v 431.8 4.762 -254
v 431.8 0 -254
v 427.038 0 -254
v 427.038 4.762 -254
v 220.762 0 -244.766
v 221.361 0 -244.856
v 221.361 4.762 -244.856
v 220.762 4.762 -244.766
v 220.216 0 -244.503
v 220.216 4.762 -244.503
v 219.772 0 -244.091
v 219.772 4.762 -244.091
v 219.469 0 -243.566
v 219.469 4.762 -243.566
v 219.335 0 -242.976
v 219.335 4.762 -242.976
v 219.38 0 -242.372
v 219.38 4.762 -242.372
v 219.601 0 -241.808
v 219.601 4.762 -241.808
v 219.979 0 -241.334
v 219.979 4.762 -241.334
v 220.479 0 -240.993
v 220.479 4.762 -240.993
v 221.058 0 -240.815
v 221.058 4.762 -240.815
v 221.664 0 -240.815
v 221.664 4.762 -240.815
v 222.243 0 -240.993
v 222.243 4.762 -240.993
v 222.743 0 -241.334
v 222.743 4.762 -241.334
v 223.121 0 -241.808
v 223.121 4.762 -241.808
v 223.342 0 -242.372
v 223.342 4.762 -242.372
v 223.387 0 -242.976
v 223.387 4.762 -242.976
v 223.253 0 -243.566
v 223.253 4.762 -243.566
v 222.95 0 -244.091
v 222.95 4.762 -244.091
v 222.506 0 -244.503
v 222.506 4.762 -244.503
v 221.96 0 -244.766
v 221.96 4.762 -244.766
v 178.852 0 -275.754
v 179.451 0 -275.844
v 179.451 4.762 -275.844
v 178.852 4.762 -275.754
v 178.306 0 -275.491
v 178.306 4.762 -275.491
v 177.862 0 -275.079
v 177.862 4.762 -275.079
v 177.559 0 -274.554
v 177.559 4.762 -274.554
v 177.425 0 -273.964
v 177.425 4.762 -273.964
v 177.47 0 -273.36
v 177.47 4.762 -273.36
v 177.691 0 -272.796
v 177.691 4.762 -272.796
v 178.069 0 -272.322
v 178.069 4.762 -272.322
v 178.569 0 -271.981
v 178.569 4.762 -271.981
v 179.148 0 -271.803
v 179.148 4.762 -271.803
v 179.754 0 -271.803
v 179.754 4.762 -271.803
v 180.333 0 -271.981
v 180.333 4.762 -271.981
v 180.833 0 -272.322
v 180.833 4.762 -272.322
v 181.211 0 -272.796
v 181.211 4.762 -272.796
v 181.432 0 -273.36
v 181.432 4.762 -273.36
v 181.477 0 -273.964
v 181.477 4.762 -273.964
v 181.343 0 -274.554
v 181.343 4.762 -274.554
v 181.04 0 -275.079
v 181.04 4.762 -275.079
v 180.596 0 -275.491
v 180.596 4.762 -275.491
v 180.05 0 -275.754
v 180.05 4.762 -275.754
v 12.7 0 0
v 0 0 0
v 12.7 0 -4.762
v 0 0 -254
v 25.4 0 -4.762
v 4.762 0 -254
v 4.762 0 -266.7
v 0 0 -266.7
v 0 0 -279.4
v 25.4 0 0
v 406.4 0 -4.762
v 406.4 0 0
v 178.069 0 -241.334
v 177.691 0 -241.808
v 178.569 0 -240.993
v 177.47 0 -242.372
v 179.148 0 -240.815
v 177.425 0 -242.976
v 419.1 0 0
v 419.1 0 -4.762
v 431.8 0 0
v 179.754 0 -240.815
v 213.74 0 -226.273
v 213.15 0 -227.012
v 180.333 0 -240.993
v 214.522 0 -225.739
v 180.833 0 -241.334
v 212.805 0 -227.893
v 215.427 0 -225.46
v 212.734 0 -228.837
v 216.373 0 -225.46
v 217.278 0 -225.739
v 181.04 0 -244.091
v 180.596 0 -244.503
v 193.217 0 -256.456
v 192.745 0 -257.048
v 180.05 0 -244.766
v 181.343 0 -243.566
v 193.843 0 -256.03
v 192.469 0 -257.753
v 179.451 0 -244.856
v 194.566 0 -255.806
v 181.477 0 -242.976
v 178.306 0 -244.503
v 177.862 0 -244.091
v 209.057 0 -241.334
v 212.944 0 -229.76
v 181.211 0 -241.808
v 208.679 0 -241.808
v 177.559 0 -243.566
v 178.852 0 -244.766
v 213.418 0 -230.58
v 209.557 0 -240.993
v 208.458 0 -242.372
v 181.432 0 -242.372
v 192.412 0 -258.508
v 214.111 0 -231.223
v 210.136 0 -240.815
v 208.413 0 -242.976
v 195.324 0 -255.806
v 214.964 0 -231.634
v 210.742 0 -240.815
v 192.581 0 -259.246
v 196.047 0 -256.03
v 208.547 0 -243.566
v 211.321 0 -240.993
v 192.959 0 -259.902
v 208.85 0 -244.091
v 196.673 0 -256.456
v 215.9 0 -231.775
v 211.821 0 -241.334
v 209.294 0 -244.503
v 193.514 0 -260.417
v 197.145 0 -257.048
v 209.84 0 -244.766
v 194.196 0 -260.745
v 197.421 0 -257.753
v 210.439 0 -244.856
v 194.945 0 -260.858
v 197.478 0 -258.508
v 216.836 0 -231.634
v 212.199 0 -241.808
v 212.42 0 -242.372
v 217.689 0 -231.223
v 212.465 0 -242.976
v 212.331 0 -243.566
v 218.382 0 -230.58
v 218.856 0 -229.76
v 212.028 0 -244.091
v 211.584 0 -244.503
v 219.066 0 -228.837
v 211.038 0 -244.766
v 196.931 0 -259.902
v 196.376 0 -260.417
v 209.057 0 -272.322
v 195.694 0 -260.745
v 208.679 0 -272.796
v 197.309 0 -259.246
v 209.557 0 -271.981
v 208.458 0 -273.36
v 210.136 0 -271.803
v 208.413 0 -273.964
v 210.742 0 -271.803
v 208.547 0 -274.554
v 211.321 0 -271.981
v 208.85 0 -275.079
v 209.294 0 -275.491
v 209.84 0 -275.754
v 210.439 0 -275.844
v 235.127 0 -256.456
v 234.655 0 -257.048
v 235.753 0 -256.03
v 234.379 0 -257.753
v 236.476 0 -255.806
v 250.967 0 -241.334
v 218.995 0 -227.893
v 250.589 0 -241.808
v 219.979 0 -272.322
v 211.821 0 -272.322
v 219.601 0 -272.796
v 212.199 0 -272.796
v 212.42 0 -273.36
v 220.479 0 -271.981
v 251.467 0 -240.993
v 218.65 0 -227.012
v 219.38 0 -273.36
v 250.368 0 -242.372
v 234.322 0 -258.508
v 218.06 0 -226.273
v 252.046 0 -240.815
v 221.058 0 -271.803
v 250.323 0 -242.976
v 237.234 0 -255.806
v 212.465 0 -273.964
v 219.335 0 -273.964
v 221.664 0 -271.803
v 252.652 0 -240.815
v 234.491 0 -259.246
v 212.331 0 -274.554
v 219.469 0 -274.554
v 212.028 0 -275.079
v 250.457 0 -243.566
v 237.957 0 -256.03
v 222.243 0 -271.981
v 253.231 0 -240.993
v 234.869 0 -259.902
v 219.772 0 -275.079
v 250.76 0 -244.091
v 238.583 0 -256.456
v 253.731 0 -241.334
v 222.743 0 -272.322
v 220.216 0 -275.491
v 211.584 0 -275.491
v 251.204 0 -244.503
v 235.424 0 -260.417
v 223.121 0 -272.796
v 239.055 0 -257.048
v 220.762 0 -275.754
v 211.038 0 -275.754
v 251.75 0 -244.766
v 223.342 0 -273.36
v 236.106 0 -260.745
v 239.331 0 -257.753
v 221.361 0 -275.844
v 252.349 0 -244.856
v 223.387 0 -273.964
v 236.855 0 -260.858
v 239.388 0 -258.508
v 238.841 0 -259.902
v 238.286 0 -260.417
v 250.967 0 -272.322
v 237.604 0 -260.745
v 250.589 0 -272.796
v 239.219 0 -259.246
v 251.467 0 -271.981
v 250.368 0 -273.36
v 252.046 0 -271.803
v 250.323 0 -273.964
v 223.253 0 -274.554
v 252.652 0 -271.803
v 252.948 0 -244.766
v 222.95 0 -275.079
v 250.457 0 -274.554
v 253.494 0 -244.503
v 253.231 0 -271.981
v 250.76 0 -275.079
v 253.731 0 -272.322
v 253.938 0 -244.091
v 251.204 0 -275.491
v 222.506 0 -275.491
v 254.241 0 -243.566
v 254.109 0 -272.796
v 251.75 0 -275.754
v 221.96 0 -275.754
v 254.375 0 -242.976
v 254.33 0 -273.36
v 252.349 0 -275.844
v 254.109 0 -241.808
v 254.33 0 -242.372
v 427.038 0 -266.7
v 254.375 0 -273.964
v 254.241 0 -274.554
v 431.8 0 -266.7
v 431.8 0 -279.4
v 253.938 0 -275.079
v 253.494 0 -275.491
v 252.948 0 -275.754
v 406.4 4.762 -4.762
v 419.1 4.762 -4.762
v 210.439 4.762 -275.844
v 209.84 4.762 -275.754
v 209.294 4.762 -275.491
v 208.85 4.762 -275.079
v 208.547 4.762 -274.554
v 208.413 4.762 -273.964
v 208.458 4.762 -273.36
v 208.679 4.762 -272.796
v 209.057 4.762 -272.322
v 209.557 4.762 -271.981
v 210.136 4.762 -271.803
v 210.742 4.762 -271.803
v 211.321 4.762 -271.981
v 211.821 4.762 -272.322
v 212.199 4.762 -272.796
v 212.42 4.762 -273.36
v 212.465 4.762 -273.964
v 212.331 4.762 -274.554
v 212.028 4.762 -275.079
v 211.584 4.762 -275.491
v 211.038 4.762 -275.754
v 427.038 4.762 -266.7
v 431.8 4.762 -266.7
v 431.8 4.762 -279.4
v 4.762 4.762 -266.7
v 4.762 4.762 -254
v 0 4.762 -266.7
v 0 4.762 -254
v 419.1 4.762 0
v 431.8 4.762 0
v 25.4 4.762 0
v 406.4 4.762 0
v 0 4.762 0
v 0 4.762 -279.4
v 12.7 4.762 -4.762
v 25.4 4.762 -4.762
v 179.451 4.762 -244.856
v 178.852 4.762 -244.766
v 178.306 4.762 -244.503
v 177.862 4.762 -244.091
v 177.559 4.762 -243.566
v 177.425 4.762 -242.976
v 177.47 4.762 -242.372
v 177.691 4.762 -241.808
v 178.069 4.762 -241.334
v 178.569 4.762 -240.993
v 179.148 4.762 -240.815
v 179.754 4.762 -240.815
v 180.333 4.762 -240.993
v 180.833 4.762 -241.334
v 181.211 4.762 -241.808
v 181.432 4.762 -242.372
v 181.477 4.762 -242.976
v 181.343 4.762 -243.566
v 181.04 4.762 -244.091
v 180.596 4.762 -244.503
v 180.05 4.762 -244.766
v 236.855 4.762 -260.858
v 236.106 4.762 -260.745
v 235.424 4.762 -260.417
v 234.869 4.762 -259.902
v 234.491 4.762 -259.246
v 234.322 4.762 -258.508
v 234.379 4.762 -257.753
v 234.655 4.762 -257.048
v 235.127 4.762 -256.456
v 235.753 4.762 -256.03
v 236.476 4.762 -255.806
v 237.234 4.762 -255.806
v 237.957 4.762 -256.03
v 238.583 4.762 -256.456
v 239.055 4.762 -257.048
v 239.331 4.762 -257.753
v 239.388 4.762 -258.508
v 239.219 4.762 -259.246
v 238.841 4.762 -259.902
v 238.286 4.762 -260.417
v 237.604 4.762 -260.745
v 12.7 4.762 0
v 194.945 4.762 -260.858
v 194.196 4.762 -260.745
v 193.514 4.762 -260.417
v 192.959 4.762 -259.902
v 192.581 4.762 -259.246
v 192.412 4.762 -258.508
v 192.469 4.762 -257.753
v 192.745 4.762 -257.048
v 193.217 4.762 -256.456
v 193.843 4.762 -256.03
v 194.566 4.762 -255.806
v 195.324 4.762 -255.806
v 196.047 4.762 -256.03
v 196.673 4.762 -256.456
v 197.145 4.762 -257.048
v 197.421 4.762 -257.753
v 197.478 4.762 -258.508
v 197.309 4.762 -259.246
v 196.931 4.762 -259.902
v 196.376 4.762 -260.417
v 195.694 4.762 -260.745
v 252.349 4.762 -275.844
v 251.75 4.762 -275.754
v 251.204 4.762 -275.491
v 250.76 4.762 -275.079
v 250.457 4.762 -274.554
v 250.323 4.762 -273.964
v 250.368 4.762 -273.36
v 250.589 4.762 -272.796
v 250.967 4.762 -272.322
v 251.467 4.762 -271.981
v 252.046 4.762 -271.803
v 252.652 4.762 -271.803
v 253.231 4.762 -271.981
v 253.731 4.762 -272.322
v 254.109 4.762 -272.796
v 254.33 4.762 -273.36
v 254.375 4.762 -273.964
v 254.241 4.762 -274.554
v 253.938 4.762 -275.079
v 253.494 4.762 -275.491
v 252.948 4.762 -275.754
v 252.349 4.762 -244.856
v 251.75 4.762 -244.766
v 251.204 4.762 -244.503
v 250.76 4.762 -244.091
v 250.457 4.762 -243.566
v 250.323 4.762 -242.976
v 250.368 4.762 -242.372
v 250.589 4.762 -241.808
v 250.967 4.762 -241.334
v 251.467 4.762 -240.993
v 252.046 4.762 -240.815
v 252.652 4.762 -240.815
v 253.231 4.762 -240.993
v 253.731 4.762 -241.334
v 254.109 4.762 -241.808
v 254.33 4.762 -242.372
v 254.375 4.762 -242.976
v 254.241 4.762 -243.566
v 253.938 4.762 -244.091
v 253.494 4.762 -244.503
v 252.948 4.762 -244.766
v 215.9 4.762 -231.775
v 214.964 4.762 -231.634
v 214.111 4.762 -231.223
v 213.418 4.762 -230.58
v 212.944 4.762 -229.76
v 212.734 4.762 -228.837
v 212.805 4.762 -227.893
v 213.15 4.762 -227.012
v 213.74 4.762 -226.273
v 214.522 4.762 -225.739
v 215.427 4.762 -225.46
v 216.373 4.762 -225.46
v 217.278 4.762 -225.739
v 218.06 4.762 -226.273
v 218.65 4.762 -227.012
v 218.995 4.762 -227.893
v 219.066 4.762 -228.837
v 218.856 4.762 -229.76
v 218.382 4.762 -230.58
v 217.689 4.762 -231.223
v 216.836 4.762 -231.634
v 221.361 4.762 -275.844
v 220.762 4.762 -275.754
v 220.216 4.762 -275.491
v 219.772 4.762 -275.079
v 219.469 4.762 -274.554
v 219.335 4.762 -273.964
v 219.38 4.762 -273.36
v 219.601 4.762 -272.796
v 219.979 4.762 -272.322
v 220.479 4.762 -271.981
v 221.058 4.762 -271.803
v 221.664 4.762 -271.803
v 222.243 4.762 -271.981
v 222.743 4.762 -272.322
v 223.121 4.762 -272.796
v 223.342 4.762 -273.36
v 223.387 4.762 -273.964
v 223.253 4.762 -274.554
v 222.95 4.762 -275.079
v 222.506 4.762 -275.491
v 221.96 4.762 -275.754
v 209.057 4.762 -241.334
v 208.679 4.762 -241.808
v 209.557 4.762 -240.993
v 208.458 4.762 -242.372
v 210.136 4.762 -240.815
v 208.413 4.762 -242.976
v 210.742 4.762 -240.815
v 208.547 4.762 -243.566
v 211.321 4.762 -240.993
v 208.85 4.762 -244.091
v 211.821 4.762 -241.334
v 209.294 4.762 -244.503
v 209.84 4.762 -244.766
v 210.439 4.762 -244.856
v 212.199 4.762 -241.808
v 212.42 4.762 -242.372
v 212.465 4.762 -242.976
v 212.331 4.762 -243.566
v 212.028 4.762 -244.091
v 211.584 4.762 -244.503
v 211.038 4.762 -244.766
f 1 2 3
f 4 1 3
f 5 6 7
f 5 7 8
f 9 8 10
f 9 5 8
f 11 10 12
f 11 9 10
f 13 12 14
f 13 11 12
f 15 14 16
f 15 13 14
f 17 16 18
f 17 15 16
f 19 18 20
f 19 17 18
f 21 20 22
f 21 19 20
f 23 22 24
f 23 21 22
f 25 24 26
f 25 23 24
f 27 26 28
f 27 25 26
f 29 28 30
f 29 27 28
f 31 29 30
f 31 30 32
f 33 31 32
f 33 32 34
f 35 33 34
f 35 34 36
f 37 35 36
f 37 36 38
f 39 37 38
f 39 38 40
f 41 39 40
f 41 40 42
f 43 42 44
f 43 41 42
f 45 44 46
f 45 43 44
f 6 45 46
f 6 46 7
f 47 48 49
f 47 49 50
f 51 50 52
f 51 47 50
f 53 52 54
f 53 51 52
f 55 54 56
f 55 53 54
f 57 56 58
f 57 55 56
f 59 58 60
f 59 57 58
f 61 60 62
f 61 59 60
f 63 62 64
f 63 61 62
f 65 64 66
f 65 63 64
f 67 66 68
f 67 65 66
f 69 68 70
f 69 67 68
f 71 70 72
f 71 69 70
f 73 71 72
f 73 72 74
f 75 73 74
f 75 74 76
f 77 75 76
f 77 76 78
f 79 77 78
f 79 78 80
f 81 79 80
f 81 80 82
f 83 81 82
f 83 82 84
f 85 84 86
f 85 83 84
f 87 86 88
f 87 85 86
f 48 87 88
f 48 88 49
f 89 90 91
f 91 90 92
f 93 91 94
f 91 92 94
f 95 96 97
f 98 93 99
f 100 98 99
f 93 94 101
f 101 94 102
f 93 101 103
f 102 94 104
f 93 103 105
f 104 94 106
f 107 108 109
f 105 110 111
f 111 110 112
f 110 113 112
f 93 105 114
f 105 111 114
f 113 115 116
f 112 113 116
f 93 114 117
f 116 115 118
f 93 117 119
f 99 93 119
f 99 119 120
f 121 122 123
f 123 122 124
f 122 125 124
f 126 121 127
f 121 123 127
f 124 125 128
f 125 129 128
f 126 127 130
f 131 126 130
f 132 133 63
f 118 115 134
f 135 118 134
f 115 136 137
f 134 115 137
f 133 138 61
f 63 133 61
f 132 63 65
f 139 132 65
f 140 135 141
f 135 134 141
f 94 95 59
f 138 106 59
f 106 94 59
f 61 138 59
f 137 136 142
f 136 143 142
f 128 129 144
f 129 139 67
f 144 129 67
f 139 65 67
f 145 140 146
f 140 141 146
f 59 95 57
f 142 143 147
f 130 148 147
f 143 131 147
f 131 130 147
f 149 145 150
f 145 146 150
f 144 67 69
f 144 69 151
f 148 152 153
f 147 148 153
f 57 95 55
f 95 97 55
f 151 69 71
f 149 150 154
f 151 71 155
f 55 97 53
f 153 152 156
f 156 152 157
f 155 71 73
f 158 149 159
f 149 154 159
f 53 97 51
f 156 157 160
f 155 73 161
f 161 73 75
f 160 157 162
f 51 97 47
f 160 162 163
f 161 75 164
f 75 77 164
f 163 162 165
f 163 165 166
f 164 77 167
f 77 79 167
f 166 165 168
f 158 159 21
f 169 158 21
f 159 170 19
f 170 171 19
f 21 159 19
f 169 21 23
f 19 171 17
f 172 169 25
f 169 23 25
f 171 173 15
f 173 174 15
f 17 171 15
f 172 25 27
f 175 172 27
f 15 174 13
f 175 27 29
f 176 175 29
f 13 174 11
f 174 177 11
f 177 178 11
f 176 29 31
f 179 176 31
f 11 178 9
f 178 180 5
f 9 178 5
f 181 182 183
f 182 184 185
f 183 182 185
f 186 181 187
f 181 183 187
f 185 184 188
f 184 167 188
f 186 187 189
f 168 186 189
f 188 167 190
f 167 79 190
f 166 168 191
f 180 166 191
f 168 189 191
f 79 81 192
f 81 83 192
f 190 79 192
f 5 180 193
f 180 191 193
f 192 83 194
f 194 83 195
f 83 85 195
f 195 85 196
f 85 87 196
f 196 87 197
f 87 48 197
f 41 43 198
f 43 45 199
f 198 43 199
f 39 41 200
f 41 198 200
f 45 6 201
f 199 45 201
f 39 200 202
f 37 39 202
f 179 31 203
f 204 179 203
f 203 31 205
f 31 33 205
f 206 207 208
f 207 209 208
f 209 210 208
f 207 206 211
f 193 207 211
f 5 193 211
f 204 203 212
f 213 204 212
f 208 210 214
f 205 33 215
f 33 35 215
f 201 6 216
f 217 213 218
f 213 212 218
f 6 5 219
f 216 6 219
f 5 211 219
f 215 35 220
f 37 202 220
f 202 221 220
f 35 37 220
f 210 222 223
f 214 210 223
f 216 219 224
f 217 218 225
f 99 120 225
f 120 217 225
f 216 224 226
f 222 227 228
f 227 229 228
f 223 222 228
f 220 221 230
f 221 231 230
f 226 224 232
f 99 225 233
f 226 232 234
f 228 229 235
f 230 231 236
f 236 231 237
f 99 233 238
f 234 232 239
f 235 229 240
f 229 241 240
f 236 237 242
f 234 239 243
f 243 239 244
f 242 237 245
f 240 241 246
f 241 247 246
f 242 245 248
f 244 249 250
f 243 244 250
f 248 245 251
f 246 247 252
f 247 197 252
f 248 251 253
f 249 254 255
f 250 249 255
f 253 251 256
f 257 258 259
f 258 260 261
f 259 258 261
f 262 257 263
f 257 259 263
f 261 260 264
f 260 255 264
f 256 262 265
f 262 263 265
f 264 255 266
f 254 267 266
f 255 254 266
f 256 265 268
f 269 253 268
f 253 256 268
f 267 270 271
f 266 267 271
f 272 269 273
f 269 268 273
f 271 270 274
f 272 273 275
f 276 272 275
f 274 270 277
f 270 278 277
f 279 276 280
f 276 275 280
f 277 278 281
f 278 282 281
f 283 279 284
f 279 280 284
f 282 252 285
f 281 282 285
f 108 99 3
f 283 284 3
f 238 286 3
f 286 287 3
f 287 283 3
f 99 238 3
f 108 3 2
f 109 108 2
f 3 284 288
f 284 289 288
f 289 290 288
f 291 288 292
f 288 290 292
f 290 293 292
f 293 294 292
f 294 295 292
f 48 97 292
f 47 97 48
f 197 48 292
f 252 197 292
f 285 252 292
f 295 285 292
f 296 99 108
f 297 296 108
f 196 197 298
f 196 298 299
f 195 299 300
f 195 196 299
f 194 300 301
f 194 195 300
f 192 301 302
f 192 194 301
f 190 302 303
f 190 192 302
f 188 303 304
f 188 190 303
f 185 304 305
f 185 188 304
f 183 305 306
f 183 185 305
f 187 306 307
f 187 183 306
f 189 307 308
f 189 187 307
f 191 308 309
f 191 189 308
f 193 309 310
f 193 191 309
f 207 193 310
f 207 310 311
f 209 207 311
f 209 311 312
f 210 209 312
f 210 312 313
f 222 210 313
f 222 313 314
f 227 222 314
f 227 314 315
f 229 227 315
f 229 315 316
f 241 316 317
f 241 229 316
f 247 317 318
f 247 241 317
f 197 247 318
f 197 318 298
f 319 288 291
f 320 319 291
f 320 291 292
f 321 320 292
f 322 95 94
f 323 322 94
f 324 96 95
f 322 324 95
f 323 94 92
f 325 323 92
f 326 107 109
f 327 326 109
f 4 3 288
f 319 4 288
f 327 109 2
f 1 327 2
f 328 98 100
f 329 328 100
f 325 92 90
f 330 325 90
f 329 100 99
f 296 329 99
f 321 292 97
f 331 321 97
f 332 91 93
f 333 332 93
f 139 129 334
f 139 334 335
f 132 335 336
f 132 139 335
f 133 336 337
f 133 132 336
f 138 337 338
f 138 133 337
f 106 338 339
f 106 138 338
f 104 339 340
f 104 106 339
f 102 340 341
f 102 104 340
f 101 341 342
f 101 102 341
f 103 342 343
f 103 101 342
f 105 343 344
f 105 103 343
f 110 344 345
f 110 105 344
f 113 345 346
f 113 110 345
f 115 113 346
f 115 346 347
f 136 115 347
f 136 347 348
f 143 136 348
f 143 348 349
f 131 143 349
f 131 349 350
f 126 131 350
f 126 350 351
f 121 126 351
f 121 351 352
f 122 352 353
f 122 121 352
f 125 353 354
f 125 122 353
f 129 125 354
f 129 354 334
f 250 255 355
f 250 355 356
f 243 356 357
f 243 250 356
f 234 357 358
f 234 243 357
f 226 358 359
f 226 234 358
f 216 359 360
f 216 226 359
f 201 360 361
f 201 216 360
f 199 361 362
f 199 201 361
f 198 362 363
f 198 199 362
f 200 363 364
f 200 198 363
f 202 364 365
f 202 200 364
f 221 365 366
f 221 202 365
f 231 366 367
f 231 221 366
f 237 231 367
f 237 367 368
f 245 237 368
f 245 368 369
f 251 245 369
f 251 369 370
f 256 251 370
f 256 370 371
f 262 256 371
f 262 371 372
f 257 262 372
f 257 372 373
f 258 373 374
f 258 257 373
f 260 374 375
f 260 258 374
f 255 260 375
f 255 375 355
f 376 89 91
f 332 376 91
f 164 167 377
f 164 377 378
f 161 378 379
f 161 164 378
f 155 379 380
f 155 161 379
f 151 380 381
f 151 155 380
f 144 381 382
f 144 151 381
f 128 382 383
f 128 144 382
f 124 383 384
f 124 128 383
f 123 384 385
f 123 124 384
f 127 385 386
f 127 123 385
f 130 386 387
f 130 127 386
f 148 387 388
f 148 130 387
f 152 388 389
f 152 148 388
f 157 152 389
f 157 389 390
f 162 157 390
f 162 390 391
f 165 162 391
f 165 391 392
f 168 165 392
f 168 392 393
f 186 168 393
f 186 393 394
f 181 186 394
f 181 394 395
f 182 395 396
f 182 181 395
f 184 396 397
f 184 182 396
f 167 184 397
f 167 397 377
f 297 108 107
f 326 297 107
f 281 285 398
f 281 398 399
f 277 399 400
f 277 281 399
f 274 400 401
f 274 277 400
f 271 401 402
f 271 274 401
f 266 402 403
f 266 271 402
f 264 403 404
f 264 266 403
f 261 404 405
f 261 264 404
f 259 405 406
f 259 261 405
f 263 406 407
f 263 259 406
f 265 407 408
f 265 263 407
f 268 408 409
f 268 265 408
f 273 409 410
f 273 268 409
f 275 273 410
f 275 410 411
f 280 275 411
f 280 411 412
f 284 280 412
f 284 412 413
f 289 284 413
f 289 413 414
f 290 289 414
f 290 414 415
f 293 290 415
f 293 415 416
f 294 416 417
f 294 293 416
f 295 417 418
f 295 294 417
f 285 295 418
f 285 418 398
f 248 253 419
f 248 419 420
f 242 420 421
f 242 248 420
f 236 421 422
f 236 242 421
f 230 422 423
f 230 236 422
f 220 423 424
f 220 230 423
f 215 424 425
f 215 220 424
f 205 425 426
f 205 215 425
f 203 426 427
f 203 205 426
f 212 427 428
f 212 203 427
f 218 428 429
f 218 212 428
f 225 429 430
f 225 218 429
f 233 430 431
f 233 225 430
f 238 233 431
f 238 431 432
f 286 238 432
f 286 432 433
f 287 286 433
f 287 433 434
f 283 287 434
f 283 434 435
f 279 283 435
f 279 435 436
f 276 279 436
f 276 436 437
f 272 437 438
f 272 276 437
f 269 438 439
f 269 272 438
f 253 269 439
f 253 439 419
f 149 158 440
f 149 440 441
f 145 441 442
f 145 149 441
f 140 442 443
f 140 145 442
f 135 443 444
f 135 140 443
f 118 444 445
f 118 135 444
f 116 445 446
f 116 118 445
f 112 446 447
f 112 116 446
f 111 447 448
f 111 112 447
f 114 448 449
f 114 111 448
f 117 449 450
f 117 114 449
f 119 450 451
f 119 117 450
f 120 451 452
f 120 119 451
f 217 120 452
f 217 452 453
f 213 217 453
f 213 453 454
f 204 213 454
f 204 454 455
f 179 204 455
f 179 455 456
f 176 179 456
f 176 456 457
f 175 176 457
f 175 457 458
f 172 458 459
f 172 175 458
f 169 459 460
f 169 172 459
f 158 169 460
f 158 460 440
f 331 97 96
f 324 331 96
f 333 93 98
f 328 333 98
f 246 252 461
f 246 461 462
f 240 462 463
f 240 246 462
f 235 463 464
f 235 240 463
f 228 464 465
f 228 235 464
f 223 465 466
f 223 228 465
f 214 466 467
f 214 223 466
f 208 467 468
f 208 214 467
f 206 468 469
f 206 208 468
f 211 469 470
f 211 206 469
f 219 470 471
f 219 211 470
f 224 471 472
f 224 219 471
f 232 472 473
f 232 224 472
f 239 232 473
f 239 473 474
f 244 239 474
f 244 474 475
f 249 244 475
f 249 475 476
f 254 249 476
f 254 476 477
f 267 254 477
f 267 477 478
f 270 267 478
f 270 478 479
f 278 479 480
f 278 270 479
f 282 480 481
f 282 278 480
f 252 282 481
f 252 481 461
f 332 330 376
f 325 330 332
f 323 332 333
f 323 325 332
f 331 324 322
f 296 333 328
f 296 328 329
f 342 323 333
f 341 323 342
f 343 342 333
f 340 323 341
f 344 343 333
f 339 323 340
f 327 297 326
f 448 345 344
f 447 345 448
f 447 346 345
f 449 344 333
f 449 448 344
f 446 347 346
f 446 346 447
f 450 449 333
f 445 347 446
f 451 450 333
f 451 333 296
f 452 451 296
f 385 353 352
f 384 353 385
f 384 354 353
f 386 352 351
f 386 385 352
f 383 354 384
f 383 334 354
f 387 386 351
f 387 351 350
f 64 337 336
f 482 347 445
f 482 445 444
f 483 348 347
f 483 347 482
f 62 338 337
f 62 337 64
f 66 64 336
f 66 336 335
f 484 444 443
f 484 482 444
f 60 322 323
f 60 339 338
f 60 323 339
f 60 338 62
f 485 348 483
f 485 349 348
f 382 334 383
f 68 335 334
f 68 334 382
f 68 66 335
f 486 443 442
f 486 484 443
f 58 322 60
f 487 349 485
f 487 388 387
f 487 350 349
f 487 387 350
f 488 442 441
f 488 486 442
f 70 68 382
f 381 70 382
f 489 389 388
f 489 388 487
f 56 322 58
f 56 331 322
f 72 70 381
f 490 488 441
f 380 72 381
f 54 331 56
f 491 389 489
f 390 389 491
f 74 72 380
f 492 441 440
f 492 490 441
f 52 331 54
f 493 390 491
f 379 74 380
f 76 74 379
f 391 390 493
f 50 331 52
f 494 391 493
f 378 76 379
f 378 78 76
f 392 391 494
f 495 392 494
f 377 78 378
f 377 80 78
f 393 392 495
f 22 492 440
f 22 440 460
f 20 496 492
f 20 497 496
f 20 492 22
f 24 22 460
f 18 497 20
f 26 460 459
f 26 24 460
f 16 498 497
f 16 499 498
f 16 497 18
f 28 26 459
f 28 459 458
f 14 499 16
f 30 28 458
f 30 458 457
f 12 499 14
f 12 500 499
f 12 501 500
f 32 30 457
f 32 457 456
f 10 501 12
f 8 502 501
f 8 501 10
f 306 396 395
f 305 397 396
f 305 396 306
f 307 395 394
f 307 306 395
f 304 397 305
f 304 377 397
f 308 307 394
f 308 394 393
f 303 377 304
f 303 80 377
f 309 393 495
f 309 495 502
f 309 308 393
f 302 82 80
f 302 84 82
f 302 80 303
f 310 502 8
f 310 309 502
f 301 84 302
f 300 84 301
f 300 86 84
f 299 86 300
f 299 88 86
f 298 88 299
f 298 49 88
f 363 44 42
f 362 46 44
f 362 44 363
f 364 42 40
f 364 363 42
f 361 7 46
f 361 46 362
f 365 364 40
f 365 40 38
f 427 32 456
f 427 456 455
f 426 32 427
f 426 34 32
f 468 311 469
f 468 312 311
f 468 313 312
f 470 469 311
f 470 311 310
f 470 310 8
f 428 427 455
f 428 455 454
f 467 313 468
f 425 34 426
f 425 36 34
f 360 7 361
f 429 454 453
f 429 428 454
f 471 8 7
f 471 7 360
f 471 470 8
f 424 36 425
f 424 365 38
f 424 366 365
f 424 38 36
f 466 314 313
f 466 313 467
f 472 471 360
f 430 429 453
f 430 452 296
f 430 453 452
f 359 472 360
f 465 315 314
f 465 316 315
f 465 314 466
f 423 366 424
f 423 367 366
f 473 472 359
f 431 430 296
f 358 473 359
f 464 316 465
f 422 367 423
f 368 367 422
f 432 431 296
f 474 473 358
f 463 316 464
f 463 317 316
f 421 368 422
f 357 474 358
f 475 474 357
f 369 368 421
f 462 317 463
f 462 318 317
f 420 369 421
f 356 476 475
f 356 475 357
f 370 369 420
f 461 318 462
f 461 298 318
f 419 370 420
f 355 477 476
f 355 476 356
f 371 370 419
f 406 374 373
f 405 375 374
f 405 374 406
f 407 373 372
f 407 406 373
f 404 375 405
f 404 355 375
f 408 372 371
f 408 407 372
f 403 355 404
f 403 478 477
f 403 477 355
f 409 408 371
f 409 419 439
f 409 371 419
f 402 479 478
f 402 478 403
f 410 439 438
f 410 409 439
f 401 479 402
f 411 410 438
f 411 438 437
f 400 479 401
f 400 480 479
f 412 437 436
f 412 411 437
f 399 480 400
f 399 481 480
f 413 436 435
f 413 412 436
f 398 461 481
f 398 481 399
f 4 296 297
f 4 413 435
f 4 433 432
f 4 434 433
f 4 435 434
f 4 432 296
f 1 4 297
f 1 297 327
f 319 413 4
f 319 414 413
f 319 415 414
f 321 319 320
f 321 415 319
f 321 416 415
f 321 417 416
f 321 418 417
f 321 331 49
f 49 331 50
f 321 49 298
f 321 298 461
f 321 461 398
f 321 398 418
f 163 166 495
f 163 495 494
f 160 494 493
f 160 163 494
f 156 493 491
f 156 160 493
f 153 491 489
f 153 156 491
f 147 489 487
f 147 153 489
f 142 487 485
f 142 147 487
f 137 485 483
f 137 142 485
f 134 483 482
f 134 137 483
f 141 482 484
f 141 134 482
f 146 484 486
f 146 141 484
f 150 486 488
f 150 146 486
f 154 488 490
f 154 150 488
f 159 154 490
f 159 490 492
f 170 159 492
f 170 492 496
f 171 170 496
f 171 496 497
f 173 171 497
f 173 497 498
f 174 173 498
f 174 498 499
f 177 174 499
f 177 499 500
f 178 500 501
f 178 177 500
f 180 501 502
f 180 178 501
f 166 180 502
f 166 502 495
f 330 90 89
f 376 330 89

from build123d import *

# Parameters (mm, degrees)
SKETCH1_R           = 3.175
SKETCH1_R_2         = 2.032
SKETCH1_R_3         = 2.54
BOSS_EXTRUDE1_DEPTH = 4.7625


with BuildPart() as part:
    # Sketch1 → Boss-Extrude1 (new body)
    with BuildSketch(Plane(origin=(0, 0, 0), x_dir=(1, 0, 0), z_dir=(0, 1, 0))):
        Polygon((0, 0), (12.7, 0), (12.7, 4.7625), (25.4, 4.7625), (25.4, 0), (406.4, 0), (406.4, 4.7625), (419.1, 4.7625), (419.1, 0), (431.8, 0), (431.8, 254), (427.0375, 254), (427.0375, 266.7), (431.8, 266.7), (431.8, 279.4), (0, 279.4), (0, 266.7), (4.7625, 266.7), (4.7625, 254), (0, 254), align=None)
        with Locations(Location((215.9, 228.6, 0), (0, 0, 90))):
            Circle(SKETCH1_R, mode=Mode.SUBTRACT)
        with Locations(Location((210.439, 273.812, 0), (0, 0, 90))):
            Circle(SKETCH1_R_2, mode=Mode.SUBTRACT)
        with Locations(Location((179.451, 273.812, 0), (0, 0, 90))):
            Circle(SKETCH1_R_2, mode=Mode.SUBTRACT)
        with Locations(Location((252.349, 273.812, 0), (0, 0, 90))):
            Circle(SKETCH1_R_2, mode=Mode.SUBTRACT)
        with Locations(Location((221.361, 273.812, 0), (0, 0, 90))):
            Circle(SKETCH1_R_2, mode=Mode.SUBTRACT)
        with Locations(Location((194.945, 258.318, 0), (0, 0, 90))):
            Circle(SKETCH1_R_3, mode=Mode.SUBTRACT)
        with Locations(Location((210.439, 242.824, 0), (0, 0, 90))):
            Circle(SKETCH1_R_2, mode=Mode.SUBTRACT)
        with Locations(Location((179.451, 242.824, 0), (0, 0, 90))):
            Circle(SKETCH1_R_2, mode=Mode.SUBTRACT)
        with Locations(Location((221.361, 242.824, 0), (0, 0, 90))):
            Circle(SKETCH1_R_2, mode=Mode.SUBTRACT)
        with Locations(Location((236.855, 258.318, 0), (0, 0, 90))):
            Circle(SKETCH1_R_3, mode=Mode.SUBTRACT)
        with Locations(Location((252.349, 242.824, 0), (0, 0, 90))):
            Circle(SKETCH1_R_2, mode=Mode.SUBTRACT)
    extrude(amount=BOSS_EXTRUDE1_DEPTH)


solid = part.part
